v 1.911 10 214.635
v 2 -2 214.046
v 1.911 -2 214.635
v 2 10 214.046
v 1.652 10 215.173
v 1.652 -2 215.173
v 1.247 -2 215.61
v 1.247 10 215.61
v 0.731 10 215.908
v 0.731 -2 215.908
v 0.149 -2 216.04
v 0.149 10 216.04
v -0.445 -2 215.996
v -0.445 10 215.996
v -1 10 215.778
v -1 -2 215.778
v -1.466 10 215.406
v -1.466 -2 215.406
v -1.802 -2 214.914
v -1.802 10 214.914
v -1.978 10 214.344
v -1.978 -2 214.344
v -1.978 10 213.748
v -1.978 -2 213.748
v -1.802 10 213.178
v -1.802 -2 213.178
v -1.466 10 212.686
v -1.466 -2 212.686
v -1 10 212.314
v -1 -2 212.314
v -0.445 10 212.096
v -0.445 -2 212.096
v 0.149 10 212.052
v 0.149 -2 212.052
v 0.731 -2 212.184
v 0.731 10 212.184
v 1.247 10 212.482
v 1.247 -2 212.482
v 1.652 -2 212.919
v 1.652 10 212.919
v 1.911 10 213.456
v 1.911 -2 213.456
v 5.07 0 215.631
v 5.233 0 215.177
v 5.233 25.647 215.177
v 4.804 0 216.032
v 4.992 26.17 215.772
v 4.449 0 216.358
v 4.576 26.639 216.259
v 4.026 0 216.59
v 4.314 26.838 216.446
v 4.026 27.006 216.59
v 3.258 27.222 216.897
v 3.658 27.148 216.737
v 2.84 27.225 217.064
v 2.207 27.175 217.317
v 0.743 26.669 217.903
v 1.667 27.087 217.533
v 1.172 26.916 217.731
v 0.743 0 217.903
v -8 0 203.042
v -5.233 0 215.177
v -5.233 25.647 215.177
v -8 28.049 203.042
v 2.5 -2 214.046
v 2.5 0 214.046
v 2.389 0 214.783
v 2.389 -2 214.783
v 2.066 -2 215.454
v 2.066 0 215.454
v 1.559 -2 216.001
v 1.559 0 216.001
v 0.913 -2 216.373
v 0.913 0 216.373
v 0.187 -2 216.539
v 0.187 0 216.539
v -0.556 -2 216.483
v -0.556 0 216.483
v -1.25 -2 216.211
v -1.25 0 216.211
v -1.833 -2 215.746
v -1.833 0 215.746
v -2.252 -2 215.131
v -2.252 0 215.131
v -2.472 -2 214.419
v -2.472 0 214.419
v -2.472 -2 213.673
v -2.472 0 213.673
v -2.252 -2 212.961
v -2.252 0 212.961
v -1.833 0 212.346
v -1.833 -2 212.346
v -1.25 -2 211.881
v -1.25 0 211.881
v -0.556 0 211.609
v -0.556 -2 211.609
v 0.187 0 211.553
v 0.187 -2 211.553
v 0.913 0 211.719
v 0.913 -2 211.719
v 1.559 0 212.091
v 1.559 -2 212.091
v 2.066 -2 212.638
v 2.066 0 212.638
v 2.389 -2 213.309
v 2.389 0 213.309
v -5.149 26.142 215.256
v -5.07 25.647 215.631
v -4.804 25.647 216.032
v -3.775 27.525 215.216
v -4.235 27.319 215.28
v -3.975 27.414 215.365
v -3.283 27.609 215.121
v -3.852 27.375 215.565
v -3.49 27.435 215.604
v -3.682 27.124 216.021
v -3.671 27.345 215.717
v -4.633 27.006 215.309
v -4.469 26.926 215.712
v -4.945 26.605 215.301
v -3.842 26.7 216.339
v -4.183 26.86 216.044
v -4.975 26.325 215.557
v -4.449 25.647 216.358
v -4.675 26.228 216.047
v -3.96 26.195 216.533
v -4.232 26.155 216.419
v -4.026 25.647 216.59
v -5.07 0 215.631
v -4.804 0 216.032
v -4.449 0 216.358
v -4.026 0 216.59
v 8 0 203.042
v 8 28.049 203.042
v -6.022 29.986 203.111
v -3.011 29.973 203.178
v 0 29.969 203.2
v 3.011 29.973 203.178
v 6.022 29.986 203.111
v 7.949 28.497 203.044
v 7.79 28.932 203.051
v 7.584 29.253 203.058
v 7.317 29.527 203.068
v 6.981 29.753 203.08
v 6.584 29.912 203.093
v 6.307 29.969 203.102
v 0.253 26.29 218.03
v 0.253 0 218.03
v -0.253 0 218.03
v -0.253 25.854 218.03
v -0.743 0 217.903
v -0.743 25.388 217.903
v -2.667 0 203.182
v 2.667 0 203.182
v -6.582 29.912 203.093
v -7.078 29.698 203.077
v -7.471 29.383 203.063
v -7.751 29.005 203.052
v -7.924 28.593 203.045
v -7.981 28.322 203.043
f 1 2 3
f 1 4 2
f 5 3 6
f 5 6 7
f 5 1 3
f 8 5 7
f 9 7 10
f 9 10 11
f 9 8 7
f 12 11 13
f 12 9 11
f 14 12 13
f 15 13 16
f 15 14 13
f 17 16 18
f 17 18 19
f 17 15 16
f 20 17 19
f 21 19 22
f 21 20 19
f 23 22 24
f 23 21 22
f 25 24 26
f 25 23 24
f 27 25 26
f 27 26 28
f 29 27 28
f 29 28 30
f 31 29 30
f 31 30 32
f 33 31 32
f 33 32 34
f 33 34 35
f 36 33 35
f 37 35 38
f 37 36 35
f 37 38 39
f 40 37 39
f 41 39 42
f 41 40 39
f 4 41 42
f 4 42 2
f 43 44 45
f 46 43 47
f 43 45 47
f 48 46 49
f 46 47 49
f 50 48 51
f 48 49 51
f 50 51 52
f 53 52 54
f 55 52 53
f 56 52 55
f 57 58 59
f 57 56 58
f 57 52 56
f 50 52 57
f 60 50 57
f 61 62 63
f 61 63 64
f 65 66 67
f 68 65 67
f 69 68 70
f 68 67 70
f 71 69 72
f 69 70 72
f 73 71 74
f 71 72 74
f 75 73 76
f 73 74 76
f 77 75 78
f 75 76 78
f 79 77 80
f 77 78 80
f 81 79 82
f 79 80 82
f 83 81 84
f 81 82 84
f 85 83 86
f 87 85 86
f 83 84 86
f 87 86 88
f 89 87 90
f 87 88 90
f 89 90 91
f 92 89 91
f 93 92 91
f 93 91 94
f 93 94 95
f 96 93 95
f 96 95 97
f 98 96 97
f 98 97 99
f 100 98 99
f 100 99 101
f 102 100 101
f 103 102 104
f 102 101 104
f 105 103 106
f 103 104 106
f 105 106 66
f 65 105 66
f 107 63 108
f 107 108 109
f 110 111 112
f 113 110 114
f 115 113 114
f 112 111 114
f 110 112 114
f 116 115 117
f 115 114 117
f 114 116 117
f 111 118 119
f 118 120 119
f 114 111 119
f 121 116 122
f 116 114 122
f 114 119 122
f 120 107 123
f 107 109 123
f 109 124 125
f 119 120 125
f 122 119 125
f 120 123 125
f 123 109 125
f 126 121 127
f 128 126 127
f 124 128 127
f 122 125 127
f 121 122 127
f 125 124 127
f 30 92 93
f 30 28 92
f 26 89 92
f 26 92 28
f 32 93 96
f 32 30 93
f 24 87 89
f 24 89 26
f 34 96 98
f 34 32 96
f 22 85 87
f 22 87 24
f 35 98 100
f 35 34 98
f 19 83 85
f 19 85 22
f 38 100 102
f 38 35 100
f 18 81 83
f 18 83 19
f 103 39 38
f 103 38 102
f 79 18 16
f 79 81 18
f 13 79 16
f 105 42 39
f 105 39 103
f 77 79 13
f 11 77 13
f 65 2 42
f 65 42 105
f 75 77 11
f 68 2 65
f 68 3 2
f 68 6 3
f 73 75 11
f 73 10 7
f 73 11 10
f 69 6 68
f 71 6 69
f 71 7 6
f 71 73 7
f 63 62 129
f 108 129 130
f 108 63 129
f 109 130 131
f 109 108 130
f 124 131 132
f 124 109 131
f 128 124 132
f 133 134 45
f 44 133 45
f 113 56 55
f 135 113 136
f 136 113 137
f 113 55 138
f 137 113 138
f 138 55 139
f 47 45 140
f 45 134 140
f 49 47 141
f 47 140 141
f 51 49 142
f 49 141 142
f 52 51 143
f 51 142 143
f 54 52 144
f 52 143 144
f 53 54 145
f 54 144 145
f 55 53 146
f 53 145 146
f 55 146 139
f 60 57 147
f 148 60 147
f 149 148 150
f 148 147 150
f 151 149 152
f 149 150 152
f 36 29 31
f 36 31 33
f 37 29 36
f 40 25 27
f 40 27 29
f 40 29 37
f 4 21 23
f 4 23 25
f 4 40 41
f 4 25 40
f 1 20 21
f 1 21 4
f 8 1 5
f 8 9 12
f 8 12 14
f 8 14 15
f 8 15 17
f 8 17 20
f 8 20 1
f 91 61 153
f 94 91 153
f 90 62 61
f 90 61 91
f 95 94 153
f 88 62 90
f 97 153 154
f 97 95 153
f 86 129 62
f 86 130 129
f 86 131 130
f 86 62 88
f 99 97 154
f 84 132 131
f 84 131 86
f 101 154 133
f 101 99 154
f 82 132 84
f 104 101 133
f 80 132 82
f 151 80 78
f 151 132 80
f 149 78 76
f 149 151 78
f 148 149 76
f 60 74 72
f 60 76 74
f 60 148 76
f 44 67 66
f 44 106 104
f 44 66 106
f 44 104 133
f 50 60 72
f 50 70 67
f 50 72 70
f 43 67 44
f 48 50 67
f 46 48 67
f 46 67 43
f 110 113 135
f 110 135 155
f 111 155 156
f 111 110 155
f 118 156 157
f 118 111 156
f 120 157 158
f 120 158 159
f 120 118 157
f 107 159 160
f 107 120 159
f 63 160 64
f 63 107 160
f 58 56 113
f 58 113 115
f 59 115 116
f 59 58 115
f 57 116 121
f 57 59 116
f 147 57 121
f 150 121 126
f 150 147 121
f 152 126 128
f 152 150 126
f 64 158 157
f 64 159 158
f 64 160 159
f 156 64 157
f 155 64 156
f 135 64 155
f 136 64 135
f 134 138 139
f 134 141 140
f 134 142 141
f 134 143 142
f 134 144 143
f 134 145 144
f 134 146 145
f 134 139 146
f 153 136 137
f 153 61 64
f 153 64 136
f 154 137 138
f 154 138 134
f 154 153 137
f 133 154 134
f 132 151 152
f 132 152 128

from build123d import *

# Parameters (mm, degrees)
F1_DEPTH = 30
F3_DEPTH = 12.5
F4_R     = 2
F5_R     = 2
F6_DEPTH = 10
F7_R     = 2.5
F7_R_2   = 2
F8_DEPTH = 2


with BuildPart() as f1:
    # F0 (on Front) → F1 (new body)
    with BuildSketch(Plane.XZ):
        with BuildLine():
            ThreePointArc((-8, 203.042459), (0, 203.2), (8, 203.042459))
            Line((8, 203.042459), (5, 216.2))
            Line((5, 216.2), (0, 218.2))
            Line((0, 218.2), (-5, 216.2))
            Line((-5, 216.2), (-8, 203.042459))
        make_face()
    extrude(amount=-F1_DEPTH)

    # F2 (on Right) → F3 (cut, symmetric)
    with BuildSketch(Plane.YZ):
        Polygon((30, 203.042459), (30, 218.2), (27, 218.2), align=None)
    extrude(amount=F3_DEPTH, both=True, mode=Mode.SUBTRACT)

    # F4
    f4_edges = [f1.edges().sort_by_distance(p)[0] for p in [
        (5, 13.697921, 216.2),
        (0, 13.5, 218.2),
        (-5, 13.697921, 216.2),
        (-6.5, 28.697921, 209.621229),
        (-2.5, 27.197921, 217.2),
        (6.5, 28.697921, 209.621229),
    ]]
    fillet(f4_edges, radius=F4_R)

    # F5 (on face) → F6 (cut)
    with BuildSketch(Plane.XZ):
        with Locations((0, 214.045934)):
            Circle(F5_R)
    extrude(amount=-F6_DEPTH, mode=Mode.SUBTRACT)

    # F7 (on face) → F8 (join)
    with BuildSketch(Plane.XZ):
        with Locations((0, 214.045934)):
            Circle(F7_R)
        with Locations((0, 214.045934)):
            Circle(F7_R_2, mode=Mode.SUBTRACT)
    extrude(amount=F8_DEPTH)


solid = f1.part
